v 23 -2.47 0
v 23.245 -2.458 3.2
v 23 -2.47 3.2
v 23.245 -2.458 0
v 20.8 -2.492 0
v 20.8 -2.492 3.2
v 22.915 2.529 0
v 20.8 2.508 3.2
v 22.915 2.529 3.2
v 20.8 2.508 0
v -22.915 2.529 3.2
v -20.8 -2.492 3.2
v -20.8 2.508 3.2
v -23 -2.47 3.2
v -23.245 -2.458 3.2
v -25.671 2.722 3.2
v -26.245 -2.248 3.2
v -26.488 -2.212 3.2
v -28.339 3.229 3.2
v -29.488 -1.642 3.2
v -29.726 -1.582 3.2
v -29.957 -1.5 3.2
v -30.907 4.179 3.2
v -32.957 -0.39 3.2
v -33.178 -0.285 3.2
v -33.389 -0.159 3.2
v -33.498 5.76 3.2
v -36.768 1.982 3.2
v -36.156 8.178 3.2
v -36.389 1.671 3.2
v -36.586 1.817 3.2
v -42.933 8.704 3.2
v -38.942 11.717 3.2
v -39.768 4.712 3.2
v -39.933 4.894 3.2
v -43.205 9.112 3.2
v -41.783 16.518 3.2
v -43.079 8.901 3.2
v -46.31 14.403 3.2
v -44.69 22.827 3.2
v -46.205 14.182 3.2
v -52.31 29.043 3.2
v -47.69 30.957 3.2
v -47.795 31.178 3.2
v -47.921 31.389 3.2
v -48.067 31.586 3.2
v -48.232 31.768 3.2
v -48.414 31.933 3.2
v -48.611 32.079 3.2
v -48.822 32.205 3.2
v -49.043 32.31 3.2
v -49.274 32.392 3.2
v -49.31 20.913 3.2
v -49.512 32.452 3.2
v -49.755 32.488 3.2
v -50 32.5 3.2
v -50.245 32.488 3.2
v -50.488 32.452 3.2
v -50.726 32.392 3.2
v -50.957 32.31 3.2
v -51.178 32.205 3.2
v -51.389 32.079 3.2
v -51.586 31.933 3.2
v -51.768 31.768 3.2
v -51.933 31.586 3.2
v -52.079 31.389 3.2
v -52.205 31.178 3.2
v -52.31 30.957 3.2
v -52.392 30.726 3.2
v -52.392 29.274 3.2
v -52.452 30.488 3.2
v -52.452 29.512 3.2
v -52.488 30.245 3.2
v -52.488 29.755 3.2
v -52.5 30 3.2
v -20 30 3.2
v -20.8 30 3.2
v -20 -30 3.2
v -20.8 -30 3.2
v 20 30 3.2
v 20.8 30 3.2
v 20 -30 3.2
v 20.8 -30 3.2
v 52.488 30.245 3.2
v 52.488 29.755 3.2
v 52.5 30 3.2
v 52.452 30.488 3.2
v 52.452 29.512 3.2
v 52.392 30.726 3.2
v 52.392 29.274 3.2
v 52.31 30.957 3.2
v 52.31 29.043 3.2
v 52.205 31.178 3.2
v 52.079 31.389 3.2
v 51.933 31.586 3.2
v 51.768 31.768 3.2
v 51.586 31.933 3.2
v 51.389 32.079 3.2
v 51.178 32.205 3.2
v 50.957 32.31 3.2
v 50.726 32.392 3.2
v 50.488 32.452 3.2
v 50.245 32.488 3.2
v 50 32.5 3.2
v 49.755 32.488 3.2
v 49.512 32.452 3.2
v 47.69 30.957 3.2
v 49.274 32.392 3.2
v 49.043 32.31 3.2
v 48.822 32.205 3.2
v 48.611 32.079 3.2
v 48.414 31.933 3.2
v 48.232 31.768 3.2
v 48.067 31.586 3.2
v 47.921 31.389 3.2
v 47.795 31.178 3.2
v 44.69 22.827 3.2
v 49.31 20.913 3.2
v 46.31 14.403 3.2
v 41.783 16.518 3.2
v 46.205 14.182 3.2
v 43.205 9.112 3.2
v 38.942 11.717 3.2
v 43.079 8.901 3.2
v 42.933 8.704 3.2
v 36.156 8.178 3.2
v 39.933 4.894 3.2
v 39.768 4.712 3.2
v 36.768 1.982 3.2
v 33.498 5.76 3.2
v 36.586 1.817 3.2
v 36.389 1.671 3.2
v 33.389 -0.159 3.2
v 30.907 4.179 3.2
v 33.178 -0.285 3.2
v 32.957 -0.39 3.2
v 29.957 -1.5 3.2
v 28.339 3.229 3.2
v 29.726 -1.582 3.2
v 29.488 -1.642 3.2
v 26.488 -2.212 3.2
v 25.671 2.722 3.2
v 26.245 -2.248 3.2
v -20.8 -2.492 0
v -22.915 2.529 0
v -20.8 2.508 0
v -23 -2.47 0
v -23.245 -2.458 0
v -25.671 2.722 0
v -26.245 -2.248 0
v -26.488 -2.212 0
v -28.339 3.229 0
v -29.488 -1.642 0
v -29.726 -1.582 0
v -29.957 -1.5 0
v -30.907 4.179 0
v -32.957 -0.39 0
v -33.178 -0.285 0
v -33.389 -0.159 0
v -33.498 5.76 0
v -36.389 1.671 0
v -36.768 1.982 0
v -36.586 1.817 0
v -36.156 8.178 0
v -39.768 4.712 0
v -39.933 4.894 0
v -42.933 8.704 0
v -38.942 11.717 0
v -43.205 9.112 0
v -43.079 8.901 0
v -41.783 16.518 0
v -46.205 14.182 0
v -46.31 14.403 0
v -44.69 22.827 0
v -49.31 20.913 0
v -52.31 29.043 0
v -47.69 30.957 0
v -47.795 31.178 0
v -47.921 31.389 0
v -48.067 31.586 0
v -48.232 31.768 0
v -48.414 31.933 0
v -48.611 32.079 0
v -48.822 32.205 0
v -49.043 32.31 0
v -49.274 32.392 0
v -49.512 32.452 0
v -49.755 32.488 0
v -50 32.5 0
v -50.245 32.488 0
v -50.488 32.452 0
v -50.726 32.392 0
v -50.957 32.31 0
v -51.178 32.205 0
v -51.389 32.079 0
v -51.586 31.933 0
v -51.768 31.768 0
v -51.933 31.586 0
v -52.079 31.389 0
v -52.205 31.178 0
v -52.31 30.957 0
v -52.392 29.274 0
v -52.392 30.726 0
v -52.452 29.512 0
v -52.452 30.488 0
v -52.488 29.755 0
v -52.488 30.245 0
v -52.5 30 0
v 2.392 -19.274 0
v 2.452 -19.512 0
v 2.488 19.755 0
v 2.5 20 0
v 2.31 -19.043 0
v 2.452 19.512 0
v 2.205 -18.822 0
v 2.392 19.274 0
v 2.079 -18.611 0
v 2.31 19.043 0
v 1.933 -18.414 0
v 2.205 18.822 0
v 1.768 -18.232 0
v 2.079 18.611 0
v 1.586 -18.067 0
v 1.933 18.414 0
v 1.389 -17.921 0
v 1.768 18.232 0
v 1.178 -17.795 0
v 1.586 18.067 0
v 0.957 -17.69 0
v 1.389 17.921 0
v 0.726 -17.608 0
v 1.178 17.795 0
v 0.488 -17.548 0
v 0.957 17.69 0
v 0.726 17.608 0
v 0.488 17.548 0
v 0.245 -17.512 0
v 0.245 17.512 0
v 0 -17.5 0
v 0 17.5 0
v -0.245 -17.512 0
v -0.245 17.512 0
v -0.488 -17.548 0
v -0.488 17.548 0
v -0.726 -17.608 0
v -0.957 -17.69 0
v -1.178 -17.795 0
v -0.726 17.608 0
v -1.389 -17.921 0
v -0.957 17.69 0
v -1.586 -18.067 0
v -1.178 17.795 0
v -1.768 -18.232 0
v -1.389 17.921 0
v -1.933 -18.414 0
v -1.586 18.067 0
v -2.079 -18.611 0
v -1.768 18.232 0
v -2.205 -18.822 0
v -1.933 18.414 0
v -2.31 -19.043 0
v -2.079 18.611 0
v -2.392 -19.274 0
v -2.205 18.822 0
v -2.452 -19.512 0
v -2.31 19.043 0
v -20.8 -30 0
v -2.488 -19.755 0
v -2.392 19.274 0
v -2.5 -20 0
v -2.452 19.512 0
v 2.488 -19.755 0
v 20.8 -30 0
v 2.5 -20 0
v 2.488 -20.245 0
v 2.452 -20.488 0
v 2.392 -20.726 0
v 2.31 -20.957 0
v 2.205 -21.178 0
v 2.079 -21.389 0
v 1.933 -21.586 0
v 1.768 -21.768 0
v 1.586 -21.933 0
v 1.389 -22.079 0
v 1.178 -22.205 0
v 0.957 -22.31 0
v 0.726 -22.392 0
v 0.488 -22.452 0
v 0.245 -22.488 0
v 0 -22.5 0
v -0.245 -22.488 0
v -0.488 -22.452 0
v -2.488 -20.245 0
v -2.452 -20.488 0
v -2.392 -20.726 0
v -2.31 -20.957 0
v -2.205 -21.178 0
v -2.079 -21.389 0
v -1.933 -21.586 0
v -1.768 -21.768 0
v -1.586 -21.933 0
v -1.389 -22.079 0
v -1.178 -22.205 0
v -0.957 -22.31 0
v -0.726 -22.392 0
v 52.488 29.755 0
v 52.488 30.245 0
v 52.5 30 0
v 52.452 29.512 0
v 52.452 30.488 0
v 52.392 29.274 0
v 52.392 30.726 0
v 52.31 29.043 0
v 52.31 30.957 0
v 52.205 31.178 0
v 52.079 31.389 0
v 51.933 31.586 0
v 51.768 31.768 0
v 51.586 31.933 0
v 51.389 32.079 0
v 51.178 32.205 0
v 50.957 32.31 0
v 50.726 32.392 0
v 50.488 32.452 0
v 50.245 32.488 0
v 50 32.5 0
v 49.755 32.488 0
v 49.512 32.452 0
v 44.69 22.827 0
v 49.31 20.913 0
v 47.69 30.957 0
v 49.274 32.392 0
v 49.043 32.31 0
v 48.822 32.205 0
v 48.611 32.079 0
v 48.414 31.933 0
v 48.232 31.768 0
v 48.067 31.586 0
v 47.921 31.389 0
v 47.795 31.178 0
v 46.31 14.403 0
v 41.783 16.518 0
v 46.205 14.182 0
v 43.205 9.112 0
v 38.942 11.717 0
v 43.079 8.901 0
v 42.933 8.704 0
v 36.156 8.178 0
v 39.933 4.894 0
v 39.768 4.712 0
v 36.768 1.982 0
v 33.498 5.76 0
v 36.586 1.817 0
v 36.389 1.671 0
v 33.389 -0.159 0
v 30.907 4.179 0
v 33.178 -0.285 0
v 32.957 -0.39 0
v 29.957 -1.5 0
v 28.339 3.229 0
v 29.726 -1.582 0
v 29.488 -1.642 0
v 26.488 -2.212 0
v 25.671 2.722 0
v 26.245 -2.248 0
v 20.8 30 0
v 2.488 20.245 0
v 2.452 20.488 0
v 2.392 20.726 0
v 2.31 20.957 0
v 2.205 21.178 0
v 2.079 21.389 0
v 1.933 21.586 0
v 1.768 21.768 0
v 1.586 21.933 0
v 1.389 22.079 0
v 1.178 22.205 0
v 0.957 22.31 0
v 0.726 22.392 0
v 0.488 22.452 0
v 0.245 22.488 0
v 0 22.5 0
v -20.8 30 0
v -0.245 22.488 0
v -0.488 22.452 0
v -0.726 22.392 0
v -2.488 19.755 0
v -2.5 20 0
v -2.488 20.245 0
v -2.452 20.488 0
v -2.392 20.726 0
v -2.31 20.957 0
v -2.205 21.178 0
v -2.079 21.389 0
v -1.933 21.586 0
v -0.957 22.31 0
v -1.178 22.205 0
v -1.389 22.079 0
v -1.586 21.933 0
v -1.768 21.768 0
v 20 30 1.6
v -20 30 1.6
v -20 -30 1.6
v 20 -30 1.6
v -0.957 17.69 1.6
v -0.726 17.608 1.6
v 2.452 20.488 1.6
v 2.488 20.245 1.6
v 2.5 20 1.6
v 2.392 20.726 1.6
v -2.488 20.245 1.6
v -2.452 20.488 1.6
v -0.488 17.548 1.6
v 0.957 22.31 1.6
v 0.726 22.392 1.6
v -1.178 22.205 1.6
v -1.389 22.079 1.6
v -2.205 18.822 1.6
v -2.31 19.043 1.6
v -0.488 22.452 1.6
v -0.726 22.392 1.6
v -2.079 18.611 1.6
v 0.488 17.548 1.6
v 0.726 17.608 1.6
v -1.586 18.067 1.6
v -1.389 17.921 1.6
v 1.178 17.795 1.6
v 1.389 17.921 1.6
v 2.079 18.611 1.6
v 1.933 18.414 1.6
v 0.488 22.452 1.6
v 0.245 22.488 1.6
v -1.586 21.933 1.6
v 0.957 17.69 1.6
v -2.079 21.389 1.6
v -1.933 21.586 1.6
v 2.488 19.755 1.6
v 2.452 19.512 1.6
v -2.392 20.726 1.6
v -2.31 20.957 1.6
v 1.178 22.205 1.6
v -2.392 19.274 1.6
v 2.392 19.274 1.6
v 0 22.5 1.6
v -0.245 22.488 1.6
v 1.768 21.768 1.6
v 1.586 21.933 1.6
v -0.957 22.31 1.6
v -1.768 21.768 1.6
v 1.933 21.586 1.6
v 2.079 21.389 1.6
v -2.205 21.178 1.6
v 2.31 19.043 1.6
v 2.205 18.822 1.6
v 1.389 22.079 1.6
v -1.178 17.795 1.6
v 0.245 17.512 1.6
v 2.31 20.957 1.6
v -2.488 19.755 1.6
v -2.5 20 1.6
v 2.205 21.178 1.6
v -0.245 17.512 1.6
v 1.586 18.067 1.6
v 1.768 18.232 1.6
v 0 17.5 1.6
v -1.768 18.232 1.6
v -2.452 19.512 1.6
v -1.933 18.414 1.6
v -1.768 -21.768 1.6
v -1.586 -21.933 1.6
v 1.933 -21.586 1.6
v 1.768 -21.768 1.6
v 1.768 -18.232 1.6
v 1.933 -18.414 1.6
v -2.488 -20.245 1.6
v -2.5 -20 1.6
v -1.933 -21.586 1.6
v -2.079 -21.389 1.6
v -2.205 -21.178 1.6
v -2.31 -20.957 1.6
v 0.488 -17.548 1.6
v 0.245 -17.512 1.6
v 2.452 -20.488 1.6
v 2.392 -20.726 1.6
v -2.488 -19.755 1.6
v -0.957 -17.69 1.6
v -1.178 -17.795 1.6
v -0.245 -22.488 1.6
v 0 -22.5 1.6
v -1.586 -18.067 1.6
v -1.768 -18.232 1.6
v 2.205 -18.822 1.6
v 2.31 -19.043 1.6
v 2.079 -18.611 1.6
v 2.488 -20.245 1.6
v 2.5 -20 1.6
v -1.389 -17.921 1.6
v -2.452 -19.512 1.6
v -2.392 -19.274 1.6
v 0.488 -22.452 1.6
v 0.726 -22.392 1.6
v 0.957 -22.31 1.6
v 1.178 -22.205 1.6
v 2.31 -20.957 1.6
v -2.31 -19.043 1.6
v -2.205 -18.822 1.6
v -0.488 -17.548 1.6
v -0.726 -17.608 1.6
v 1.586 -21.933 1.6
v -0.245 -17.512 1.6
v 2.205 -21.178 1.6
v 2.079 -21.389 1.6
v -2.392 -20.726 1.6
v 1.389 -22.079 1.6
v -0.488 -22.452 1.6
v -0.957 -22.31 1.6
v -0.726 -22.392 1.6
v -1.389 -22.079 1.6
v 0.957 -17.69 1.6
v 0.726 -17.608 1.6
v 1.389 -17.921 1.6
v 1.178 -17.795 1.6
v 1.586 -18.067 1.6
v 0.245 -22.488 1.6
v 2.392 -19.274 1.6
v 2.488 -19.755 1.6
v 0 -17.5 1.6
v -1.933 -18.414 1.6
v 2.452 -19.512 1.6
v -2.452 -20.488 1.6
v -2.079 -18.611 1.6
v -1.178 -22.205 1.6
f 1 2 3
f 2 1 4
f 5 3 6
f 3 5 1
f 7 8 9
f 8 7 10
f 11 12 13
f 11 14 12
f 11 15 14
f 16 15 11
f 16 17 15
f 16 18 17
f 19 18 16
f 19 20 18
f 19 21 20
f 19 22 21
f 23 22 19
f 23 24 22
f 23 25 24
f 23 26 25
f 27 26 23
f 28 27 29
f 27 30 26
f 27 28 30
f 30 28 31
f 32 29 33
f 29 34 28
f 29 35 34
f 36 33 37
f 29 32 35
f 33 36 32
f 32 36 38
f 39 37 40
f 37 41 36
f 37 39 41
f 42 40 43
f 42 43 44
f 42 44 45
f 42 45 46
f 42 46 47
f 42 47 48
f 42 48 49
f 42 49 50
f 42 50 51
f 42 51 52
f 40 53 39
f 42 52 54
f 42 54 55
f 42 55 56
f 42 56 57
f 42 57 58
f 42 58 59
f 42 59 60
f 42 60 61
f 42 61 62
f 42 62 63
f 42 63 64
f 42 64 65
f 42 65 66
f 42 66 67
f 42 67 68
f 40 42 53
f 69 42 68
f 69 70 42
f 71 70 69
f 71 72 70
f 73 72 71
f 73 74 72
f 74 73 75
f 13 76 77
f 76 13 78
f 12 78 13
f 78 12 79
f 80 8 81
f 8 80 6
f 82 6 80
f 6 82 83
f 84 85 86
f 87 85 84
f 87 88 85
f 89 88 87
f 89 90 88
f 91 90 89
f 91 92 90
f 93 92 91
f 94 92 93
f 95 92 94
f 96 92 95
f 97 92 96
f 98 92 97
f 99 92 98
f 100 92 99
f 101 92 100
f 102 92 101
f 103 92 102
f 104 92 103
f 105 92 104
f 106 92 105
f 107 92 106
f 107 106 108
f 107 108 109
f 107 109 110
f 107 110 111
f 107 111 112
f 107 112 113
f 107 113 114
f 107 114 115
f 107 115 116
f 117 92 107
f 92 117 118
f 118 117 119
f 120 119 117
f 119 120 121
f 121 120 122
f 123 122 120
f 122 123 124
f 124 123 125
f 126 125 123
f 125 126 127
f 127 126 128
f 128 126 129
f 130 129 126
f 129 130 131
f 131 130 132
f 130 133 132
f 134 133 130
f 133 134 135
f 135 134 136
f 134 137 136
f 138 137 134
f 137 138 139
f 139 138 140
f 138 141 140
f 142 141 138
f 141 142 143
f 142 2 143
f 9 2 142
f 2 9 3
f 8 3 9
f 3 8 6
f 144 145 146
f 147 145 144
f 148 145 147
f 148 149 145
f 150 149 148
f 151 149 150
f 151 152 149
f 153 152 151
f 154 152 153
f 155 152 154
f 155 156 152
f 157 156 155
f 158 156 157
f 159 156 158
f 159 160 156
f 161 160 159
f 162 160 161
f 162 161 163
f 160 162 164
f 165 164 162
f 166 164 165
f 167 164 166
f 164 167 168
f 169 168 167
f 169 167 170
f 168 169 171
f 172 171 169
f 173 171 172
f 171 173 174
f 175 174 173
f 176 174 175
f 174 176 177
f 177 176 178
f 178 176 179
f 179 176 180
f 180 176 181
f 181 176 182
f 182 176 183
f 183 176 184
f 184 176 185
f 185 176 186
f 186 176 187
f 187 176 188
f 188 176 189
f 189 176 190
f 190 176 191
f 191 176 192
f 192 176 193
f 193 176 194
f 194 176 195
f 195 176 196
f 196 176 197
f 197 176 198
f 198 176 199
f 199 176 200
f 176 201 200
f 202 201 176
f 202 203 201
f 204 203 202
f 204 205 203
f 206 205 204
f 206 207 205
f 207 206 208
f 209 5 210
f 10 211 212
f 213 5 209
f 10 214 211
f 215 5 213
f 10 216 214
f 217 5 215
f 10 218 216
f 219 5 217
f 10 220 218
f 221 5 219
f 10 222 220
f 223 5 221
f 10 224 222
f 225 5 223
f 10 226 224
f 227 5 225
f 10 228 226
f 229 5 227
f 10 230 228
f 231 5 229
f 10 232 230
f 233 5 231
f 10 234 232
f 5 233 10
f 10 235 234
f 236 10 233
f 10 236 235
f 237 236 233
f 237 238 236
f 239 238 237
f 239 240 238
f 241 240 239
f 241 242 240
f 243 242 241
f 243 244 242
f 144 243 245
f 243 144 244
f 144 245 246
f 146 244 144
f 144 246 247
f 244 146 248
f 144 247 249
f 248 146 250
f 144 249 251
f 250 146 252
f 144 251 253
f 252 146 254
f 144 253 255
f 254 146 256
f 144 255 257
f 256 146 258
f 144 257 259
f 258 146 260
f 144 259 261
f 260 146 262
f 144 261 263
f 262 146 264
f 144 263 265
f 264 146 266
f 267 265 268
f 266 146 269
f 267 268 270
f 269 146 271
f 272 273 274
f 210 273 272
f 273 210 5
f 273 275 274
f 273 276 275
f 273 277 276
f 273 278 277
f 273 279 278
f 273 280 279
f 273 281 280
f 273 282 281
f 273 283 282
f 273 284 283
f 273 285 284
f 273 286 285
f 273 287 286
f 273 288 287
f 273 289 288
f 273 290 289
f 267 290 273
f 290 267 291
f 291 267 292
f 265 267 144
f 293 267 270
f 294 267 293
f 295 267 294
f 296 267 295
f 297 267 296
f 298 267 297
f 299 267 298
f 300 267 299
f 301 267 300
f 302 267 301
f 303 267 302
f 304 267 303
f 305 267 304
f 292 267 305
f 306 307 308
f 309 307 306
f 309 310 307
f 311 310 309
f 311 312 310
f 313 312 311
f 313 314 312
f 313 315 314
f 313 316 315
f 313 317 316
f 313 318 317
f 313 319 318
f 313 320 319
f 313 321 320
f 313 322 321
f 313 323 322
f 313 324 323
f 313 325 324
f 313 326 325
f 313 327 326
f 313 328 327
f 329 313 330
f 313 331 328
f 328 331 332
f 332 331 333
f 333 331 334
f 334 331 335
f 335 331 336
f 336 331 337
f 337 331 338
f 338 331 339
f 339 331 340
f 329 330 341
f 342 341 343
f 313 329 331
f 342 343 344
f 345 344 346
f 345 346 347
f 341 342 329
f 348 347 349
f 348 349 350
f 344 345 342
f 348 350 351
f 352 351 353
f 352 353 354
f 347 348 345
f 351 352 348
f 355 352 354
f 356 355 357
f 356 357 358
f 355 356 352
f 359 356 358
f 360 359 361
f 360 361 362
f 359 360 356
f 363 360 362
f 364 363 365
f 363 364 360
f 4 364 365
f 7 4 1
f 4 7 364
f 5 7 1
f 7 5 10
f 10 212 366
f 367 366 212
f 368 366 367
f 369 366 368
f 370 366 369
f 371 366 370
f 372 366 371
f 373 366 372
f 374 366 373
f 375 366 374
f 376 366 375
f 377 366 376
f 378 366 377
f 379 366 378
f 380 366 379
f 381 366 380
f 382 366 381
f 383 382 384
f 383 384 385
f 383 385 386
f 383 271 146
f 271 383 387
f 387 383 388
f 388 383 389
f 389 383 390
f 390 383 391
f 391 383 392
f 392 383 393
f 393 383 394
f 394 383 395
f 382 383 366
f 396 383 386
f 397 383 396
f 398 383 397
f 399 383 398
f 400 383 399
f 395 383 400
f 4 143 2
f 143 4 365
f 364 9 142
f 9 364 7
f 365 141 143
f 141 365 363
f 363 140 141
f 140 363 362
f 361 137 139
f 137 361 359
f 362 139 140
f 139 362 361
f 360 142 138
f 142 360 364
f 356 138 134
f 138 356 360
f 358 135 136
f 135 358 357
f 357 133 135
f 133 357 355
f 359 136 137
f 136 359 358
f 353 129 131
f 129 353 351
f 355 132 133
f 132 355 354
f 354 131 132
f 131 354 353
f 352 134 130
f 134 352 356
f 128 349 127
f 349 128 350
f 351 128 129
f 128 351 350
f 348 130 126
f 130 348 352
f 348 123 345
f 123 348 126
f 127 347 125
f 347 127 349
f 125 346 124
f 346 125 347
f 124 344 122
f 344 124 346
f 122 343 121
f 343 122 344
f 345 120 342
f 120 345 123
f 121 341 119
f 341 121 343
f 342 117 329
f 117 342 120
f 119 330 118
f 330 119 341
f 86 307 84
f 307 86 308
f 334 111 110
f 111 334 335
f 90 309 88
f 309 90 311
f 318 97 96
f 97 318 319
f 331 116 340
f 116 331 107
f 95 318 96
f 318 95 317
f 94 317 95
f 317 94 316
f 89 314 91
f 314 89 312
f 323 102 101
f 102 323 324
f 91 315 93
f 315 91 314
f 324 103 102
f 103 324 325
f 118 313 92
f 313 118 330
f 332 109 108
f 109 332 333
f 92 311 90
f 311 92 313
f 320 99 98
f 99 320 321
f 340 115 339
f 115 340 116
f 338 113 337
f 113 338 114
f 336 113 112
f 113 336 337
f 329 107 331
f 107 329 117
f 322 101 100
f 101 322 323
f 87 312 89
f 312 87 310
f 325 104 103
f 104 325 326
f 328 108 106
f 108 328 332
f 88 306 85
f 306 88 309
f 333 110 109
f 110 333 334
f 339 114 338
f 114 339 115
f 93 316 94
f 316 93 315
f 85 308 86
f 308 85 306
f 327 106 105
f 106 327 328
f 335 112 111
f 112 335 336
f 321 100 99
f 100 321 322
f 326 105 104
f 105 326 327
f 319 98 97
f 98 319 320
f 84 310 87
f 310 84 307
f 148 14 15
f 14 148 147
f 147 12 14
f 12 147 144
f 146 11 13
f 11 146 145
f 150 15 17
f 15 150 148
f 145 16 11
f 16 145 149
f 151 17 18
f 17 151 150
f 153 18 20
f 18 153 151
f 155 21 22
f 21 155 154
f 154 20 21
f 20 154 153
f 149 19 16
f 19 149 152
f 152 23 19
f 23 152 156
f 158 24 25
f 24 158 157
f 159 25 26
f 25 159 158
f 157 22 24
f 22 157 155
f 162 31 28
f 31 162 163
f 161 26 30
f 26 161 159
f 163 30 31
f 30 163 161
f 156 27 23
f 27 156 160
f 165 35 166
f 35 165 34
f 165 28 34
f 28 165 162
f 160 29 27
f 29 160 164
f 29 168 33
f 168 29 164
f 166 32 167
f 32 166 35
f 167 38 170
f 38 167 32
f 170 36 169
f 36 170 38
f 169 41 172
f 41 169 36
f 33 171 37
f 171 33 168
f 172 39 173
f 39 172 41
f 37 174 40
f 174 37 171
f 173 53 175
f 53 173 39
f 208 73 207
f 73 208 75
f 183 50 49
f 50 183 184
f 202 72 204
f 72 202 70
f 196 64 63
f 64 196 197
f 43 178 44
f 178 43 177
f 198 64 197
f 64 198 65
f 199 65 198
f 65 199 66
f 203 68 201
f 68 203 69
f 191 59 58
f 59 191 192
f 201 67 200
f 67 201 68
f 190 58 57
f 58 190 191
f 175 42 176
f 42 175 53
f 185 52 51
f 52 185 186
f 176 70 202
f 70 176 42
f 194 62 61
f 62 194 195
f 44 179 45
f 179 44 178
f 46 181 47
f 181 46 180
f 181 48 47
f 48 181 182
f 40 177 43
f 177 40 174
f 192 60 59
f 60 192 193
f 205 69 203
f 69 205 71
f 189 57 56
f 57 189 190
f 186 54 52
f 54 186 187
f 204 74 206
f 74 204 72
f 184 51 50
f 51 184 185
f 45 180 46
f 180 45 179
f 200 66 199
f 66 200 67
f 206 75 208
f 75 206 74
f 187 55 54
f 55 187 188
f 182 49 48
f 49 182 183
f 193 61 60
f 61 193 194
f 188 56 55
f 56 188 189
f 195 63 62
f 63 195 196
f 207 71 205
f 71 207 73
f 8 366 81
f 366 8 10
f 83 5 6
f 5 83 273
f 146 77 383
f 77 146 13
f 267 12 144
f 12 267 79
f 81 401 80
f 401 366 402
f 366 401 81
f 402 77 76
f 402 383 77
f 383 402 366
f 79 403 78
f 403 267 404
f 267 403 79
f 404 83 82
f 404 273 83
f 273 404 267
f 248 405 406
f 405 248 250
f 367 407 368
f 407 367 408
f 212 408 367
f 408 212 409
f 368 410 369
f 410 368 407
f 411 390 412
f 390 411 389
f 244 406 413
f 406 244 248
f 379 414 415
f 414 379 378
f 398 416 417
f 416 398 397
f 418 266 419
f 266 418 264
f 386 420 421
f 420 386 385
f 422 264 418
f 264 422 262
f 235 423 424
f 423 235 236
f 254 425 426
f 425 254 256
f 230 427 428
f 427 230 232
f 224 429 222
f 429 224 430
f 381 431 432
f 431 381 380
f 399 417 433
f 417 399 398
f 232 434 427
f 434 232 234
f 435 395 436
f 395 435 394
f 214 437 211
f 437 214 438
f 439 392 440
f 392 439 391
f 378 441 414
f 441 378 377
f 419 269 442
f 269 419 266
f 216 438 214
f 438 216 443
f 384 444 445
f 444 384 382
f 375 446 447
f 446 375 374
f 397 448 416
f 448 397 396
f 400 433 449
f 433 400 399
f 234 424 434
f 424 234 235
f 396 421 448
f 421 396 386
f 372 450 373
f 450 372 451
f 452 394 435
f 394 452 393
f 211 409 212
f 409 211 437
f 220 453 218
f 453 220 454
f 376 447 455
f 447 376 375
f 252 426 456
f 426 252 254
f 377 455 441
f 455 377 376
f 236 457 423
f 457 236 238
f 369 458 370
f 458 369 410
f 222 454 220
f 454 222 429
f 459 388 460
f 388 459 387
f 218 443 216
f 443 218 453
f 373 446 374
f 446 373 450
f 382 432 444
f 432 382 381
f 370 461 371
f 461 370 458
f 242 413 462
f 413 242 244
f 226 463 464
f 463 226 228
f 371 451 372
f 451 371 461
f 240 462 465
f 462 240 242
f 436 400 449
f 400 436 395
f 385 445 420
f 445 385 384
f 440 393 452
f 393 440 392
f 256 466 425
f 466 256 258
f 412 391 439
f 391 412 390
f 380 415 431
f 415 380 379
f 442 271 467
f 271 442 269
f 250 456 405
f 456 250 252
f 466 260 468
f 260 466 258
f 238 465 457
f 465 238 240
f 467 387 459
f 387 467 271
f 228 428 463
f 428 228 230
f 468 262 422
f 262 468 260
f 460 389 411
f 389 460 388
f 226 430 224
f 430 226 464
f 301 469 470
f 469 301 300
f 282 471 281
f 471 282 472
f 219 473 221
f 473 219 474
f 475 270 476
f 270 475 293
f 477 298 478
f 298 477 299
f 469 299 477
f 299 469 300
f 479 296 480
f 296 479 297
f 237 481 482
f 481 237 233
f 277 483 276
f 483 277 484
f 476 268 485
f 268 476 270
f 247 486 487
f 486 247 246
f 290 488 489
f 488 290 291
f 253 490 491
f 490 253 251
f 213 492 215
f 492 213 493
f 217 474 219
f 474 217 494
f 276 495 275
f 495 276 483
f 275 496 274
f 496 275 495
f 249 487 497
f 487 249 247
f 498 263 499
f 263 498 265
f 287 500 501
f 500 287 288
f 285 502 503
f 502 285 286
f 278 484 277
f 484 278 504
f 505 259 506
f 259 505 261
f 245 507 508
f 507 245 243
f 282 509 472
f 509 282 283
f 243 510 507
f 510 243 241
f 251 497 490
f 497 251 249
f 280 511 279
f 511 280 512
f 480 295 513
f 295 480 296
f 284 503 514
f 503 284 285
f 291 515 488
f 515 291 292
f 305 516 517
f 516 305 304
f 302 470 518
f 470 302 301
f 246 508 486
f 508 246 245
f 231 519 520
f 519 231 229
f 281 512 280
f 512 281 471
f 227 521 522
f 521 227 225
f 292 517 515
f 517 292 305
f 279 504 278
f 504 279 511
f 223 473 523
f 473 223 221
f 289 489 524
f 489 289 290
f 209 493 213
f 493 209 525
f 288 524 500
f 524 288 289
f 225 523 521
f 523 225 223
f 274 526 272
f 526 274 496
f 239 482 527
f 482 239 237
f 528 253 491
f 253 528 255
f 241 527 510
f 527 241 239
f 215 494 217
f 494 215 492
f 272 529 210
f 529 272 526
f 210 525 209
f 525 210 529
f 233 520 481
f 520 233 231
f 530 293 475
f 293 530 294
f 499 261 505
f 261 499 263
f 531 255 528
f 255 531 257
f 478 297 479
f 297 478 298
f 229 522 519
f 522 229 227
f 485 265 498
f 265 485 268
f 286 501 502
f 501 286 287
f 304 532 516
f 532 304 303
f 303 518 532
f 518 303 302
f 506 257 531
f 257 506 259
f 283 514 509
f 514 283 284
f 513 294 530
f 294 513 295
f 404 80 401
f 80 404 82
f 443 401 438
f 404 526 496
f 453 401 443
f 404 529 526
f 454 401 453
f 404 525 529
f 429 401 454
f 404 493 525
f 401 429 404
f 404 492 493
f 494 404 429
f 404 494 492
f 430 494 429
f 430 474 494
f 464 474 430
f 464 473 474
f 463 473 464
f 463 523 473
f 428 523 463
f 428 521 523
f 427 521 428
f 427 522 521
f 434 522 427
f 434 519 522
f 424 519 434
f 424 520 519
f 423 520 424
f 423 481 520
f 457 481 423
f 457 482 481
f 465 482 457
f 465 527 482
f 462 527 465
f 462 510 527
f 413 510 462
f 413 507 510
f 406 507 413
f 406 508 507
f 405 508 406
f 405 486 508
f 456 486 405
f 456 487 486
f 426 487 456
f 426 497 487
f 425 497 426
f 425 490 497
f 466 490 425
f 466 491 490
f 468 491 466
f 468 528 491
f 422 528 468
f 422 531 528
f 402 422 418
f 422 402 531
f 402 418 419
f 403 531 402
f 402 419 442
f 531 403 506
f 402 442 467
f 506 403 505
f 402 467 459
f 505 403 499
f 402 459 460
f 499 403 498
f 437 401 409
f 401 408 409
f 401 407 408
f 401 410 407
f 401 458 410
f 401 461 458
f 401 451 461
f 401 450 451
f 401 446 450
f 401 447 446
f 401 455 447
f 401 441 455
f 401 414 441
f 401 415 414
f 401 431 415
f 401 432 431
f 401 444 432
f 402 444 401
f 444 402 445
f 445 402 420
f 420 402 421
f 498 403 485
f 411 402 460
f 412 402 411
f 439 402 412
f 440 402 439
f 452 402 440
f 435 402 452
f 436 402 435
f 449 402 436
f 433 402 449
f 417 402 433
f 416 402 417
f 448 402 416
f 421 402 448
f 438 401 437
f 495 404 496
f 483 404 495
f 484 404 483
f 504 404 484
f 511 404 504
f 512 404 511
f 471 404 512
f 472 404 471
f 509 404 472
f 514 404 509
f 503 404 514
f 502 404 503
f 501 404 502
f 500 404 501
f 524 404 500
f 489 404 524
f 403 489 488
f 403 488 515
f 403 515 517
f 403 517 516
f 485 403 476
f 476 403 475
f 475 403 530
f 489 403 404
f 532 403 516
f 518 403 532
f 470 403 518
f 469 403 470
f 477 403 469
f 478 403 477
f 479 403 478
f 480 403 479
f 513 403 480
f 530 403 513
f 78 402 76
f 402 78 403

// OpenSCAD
// file: syms.scad
module symY(t) {
    translate(t)
        children();
    mirror([0,1,0])
        translate(t)
            children();
}
module symX(t) {
    translate(t)
        children();
    mirror([1,0,0])
        translate(t)
            children();
}

module symZ(t) {
    translate(t)
        children();
    mirror([0,0,1])
        translate(t)
            children();
}

module	symXY(t) {
	tx=t[0];
	ty=t[1];
	tz=t[2];
	symX([tx,0,0])
	symY([0,ty,tz])
		children();
}

module magnetCut(D,S) {
    cylinder(d=D,h=10);
    for(d=[45,-45])
    rotate(d)
    cube([2*D,S,30],center=true);
}


// calculates the radius from "segment" paramers:
// https://en.wikipedia.org/wiki/Circular_segment
function    circleSlice2radius2(c,h) = (c*c/8/h)+ h/2;
// main file
use<syms.scad>
$fn=64;

W=1.6;
B_W=40;
B_H=60;


    module     allHull(p) {
        for(i = [0:len(p)-2]) {
//        for(j = [i+1:len(p)-1]) {
            hull(){
                translate(p[i])
                children();
                translate(p[i+1])
                children();
            }
        }
    }


difference() {
    R=30;
    union() {
        translate([0,0,W])
        cube([B_W+W,B_H,2*W],center=true);
        symX([B_W/2,0,0])
  //          echo([for(i=[0:10:60]) [sin(i),cos(i),0] ]);
        allHull([for(i=[0:.1:1]) R*[i,i*i*i,0] ]) {
            cylinder(d=5,h=2*W);
        }
    }
    translate([0,0,2*W])
    cube([B_W,B_H+W,2*W],center=true);
    symY([0,20,0]) {
        cylinder(d=5,h=20,center=true);
    }
    
}
